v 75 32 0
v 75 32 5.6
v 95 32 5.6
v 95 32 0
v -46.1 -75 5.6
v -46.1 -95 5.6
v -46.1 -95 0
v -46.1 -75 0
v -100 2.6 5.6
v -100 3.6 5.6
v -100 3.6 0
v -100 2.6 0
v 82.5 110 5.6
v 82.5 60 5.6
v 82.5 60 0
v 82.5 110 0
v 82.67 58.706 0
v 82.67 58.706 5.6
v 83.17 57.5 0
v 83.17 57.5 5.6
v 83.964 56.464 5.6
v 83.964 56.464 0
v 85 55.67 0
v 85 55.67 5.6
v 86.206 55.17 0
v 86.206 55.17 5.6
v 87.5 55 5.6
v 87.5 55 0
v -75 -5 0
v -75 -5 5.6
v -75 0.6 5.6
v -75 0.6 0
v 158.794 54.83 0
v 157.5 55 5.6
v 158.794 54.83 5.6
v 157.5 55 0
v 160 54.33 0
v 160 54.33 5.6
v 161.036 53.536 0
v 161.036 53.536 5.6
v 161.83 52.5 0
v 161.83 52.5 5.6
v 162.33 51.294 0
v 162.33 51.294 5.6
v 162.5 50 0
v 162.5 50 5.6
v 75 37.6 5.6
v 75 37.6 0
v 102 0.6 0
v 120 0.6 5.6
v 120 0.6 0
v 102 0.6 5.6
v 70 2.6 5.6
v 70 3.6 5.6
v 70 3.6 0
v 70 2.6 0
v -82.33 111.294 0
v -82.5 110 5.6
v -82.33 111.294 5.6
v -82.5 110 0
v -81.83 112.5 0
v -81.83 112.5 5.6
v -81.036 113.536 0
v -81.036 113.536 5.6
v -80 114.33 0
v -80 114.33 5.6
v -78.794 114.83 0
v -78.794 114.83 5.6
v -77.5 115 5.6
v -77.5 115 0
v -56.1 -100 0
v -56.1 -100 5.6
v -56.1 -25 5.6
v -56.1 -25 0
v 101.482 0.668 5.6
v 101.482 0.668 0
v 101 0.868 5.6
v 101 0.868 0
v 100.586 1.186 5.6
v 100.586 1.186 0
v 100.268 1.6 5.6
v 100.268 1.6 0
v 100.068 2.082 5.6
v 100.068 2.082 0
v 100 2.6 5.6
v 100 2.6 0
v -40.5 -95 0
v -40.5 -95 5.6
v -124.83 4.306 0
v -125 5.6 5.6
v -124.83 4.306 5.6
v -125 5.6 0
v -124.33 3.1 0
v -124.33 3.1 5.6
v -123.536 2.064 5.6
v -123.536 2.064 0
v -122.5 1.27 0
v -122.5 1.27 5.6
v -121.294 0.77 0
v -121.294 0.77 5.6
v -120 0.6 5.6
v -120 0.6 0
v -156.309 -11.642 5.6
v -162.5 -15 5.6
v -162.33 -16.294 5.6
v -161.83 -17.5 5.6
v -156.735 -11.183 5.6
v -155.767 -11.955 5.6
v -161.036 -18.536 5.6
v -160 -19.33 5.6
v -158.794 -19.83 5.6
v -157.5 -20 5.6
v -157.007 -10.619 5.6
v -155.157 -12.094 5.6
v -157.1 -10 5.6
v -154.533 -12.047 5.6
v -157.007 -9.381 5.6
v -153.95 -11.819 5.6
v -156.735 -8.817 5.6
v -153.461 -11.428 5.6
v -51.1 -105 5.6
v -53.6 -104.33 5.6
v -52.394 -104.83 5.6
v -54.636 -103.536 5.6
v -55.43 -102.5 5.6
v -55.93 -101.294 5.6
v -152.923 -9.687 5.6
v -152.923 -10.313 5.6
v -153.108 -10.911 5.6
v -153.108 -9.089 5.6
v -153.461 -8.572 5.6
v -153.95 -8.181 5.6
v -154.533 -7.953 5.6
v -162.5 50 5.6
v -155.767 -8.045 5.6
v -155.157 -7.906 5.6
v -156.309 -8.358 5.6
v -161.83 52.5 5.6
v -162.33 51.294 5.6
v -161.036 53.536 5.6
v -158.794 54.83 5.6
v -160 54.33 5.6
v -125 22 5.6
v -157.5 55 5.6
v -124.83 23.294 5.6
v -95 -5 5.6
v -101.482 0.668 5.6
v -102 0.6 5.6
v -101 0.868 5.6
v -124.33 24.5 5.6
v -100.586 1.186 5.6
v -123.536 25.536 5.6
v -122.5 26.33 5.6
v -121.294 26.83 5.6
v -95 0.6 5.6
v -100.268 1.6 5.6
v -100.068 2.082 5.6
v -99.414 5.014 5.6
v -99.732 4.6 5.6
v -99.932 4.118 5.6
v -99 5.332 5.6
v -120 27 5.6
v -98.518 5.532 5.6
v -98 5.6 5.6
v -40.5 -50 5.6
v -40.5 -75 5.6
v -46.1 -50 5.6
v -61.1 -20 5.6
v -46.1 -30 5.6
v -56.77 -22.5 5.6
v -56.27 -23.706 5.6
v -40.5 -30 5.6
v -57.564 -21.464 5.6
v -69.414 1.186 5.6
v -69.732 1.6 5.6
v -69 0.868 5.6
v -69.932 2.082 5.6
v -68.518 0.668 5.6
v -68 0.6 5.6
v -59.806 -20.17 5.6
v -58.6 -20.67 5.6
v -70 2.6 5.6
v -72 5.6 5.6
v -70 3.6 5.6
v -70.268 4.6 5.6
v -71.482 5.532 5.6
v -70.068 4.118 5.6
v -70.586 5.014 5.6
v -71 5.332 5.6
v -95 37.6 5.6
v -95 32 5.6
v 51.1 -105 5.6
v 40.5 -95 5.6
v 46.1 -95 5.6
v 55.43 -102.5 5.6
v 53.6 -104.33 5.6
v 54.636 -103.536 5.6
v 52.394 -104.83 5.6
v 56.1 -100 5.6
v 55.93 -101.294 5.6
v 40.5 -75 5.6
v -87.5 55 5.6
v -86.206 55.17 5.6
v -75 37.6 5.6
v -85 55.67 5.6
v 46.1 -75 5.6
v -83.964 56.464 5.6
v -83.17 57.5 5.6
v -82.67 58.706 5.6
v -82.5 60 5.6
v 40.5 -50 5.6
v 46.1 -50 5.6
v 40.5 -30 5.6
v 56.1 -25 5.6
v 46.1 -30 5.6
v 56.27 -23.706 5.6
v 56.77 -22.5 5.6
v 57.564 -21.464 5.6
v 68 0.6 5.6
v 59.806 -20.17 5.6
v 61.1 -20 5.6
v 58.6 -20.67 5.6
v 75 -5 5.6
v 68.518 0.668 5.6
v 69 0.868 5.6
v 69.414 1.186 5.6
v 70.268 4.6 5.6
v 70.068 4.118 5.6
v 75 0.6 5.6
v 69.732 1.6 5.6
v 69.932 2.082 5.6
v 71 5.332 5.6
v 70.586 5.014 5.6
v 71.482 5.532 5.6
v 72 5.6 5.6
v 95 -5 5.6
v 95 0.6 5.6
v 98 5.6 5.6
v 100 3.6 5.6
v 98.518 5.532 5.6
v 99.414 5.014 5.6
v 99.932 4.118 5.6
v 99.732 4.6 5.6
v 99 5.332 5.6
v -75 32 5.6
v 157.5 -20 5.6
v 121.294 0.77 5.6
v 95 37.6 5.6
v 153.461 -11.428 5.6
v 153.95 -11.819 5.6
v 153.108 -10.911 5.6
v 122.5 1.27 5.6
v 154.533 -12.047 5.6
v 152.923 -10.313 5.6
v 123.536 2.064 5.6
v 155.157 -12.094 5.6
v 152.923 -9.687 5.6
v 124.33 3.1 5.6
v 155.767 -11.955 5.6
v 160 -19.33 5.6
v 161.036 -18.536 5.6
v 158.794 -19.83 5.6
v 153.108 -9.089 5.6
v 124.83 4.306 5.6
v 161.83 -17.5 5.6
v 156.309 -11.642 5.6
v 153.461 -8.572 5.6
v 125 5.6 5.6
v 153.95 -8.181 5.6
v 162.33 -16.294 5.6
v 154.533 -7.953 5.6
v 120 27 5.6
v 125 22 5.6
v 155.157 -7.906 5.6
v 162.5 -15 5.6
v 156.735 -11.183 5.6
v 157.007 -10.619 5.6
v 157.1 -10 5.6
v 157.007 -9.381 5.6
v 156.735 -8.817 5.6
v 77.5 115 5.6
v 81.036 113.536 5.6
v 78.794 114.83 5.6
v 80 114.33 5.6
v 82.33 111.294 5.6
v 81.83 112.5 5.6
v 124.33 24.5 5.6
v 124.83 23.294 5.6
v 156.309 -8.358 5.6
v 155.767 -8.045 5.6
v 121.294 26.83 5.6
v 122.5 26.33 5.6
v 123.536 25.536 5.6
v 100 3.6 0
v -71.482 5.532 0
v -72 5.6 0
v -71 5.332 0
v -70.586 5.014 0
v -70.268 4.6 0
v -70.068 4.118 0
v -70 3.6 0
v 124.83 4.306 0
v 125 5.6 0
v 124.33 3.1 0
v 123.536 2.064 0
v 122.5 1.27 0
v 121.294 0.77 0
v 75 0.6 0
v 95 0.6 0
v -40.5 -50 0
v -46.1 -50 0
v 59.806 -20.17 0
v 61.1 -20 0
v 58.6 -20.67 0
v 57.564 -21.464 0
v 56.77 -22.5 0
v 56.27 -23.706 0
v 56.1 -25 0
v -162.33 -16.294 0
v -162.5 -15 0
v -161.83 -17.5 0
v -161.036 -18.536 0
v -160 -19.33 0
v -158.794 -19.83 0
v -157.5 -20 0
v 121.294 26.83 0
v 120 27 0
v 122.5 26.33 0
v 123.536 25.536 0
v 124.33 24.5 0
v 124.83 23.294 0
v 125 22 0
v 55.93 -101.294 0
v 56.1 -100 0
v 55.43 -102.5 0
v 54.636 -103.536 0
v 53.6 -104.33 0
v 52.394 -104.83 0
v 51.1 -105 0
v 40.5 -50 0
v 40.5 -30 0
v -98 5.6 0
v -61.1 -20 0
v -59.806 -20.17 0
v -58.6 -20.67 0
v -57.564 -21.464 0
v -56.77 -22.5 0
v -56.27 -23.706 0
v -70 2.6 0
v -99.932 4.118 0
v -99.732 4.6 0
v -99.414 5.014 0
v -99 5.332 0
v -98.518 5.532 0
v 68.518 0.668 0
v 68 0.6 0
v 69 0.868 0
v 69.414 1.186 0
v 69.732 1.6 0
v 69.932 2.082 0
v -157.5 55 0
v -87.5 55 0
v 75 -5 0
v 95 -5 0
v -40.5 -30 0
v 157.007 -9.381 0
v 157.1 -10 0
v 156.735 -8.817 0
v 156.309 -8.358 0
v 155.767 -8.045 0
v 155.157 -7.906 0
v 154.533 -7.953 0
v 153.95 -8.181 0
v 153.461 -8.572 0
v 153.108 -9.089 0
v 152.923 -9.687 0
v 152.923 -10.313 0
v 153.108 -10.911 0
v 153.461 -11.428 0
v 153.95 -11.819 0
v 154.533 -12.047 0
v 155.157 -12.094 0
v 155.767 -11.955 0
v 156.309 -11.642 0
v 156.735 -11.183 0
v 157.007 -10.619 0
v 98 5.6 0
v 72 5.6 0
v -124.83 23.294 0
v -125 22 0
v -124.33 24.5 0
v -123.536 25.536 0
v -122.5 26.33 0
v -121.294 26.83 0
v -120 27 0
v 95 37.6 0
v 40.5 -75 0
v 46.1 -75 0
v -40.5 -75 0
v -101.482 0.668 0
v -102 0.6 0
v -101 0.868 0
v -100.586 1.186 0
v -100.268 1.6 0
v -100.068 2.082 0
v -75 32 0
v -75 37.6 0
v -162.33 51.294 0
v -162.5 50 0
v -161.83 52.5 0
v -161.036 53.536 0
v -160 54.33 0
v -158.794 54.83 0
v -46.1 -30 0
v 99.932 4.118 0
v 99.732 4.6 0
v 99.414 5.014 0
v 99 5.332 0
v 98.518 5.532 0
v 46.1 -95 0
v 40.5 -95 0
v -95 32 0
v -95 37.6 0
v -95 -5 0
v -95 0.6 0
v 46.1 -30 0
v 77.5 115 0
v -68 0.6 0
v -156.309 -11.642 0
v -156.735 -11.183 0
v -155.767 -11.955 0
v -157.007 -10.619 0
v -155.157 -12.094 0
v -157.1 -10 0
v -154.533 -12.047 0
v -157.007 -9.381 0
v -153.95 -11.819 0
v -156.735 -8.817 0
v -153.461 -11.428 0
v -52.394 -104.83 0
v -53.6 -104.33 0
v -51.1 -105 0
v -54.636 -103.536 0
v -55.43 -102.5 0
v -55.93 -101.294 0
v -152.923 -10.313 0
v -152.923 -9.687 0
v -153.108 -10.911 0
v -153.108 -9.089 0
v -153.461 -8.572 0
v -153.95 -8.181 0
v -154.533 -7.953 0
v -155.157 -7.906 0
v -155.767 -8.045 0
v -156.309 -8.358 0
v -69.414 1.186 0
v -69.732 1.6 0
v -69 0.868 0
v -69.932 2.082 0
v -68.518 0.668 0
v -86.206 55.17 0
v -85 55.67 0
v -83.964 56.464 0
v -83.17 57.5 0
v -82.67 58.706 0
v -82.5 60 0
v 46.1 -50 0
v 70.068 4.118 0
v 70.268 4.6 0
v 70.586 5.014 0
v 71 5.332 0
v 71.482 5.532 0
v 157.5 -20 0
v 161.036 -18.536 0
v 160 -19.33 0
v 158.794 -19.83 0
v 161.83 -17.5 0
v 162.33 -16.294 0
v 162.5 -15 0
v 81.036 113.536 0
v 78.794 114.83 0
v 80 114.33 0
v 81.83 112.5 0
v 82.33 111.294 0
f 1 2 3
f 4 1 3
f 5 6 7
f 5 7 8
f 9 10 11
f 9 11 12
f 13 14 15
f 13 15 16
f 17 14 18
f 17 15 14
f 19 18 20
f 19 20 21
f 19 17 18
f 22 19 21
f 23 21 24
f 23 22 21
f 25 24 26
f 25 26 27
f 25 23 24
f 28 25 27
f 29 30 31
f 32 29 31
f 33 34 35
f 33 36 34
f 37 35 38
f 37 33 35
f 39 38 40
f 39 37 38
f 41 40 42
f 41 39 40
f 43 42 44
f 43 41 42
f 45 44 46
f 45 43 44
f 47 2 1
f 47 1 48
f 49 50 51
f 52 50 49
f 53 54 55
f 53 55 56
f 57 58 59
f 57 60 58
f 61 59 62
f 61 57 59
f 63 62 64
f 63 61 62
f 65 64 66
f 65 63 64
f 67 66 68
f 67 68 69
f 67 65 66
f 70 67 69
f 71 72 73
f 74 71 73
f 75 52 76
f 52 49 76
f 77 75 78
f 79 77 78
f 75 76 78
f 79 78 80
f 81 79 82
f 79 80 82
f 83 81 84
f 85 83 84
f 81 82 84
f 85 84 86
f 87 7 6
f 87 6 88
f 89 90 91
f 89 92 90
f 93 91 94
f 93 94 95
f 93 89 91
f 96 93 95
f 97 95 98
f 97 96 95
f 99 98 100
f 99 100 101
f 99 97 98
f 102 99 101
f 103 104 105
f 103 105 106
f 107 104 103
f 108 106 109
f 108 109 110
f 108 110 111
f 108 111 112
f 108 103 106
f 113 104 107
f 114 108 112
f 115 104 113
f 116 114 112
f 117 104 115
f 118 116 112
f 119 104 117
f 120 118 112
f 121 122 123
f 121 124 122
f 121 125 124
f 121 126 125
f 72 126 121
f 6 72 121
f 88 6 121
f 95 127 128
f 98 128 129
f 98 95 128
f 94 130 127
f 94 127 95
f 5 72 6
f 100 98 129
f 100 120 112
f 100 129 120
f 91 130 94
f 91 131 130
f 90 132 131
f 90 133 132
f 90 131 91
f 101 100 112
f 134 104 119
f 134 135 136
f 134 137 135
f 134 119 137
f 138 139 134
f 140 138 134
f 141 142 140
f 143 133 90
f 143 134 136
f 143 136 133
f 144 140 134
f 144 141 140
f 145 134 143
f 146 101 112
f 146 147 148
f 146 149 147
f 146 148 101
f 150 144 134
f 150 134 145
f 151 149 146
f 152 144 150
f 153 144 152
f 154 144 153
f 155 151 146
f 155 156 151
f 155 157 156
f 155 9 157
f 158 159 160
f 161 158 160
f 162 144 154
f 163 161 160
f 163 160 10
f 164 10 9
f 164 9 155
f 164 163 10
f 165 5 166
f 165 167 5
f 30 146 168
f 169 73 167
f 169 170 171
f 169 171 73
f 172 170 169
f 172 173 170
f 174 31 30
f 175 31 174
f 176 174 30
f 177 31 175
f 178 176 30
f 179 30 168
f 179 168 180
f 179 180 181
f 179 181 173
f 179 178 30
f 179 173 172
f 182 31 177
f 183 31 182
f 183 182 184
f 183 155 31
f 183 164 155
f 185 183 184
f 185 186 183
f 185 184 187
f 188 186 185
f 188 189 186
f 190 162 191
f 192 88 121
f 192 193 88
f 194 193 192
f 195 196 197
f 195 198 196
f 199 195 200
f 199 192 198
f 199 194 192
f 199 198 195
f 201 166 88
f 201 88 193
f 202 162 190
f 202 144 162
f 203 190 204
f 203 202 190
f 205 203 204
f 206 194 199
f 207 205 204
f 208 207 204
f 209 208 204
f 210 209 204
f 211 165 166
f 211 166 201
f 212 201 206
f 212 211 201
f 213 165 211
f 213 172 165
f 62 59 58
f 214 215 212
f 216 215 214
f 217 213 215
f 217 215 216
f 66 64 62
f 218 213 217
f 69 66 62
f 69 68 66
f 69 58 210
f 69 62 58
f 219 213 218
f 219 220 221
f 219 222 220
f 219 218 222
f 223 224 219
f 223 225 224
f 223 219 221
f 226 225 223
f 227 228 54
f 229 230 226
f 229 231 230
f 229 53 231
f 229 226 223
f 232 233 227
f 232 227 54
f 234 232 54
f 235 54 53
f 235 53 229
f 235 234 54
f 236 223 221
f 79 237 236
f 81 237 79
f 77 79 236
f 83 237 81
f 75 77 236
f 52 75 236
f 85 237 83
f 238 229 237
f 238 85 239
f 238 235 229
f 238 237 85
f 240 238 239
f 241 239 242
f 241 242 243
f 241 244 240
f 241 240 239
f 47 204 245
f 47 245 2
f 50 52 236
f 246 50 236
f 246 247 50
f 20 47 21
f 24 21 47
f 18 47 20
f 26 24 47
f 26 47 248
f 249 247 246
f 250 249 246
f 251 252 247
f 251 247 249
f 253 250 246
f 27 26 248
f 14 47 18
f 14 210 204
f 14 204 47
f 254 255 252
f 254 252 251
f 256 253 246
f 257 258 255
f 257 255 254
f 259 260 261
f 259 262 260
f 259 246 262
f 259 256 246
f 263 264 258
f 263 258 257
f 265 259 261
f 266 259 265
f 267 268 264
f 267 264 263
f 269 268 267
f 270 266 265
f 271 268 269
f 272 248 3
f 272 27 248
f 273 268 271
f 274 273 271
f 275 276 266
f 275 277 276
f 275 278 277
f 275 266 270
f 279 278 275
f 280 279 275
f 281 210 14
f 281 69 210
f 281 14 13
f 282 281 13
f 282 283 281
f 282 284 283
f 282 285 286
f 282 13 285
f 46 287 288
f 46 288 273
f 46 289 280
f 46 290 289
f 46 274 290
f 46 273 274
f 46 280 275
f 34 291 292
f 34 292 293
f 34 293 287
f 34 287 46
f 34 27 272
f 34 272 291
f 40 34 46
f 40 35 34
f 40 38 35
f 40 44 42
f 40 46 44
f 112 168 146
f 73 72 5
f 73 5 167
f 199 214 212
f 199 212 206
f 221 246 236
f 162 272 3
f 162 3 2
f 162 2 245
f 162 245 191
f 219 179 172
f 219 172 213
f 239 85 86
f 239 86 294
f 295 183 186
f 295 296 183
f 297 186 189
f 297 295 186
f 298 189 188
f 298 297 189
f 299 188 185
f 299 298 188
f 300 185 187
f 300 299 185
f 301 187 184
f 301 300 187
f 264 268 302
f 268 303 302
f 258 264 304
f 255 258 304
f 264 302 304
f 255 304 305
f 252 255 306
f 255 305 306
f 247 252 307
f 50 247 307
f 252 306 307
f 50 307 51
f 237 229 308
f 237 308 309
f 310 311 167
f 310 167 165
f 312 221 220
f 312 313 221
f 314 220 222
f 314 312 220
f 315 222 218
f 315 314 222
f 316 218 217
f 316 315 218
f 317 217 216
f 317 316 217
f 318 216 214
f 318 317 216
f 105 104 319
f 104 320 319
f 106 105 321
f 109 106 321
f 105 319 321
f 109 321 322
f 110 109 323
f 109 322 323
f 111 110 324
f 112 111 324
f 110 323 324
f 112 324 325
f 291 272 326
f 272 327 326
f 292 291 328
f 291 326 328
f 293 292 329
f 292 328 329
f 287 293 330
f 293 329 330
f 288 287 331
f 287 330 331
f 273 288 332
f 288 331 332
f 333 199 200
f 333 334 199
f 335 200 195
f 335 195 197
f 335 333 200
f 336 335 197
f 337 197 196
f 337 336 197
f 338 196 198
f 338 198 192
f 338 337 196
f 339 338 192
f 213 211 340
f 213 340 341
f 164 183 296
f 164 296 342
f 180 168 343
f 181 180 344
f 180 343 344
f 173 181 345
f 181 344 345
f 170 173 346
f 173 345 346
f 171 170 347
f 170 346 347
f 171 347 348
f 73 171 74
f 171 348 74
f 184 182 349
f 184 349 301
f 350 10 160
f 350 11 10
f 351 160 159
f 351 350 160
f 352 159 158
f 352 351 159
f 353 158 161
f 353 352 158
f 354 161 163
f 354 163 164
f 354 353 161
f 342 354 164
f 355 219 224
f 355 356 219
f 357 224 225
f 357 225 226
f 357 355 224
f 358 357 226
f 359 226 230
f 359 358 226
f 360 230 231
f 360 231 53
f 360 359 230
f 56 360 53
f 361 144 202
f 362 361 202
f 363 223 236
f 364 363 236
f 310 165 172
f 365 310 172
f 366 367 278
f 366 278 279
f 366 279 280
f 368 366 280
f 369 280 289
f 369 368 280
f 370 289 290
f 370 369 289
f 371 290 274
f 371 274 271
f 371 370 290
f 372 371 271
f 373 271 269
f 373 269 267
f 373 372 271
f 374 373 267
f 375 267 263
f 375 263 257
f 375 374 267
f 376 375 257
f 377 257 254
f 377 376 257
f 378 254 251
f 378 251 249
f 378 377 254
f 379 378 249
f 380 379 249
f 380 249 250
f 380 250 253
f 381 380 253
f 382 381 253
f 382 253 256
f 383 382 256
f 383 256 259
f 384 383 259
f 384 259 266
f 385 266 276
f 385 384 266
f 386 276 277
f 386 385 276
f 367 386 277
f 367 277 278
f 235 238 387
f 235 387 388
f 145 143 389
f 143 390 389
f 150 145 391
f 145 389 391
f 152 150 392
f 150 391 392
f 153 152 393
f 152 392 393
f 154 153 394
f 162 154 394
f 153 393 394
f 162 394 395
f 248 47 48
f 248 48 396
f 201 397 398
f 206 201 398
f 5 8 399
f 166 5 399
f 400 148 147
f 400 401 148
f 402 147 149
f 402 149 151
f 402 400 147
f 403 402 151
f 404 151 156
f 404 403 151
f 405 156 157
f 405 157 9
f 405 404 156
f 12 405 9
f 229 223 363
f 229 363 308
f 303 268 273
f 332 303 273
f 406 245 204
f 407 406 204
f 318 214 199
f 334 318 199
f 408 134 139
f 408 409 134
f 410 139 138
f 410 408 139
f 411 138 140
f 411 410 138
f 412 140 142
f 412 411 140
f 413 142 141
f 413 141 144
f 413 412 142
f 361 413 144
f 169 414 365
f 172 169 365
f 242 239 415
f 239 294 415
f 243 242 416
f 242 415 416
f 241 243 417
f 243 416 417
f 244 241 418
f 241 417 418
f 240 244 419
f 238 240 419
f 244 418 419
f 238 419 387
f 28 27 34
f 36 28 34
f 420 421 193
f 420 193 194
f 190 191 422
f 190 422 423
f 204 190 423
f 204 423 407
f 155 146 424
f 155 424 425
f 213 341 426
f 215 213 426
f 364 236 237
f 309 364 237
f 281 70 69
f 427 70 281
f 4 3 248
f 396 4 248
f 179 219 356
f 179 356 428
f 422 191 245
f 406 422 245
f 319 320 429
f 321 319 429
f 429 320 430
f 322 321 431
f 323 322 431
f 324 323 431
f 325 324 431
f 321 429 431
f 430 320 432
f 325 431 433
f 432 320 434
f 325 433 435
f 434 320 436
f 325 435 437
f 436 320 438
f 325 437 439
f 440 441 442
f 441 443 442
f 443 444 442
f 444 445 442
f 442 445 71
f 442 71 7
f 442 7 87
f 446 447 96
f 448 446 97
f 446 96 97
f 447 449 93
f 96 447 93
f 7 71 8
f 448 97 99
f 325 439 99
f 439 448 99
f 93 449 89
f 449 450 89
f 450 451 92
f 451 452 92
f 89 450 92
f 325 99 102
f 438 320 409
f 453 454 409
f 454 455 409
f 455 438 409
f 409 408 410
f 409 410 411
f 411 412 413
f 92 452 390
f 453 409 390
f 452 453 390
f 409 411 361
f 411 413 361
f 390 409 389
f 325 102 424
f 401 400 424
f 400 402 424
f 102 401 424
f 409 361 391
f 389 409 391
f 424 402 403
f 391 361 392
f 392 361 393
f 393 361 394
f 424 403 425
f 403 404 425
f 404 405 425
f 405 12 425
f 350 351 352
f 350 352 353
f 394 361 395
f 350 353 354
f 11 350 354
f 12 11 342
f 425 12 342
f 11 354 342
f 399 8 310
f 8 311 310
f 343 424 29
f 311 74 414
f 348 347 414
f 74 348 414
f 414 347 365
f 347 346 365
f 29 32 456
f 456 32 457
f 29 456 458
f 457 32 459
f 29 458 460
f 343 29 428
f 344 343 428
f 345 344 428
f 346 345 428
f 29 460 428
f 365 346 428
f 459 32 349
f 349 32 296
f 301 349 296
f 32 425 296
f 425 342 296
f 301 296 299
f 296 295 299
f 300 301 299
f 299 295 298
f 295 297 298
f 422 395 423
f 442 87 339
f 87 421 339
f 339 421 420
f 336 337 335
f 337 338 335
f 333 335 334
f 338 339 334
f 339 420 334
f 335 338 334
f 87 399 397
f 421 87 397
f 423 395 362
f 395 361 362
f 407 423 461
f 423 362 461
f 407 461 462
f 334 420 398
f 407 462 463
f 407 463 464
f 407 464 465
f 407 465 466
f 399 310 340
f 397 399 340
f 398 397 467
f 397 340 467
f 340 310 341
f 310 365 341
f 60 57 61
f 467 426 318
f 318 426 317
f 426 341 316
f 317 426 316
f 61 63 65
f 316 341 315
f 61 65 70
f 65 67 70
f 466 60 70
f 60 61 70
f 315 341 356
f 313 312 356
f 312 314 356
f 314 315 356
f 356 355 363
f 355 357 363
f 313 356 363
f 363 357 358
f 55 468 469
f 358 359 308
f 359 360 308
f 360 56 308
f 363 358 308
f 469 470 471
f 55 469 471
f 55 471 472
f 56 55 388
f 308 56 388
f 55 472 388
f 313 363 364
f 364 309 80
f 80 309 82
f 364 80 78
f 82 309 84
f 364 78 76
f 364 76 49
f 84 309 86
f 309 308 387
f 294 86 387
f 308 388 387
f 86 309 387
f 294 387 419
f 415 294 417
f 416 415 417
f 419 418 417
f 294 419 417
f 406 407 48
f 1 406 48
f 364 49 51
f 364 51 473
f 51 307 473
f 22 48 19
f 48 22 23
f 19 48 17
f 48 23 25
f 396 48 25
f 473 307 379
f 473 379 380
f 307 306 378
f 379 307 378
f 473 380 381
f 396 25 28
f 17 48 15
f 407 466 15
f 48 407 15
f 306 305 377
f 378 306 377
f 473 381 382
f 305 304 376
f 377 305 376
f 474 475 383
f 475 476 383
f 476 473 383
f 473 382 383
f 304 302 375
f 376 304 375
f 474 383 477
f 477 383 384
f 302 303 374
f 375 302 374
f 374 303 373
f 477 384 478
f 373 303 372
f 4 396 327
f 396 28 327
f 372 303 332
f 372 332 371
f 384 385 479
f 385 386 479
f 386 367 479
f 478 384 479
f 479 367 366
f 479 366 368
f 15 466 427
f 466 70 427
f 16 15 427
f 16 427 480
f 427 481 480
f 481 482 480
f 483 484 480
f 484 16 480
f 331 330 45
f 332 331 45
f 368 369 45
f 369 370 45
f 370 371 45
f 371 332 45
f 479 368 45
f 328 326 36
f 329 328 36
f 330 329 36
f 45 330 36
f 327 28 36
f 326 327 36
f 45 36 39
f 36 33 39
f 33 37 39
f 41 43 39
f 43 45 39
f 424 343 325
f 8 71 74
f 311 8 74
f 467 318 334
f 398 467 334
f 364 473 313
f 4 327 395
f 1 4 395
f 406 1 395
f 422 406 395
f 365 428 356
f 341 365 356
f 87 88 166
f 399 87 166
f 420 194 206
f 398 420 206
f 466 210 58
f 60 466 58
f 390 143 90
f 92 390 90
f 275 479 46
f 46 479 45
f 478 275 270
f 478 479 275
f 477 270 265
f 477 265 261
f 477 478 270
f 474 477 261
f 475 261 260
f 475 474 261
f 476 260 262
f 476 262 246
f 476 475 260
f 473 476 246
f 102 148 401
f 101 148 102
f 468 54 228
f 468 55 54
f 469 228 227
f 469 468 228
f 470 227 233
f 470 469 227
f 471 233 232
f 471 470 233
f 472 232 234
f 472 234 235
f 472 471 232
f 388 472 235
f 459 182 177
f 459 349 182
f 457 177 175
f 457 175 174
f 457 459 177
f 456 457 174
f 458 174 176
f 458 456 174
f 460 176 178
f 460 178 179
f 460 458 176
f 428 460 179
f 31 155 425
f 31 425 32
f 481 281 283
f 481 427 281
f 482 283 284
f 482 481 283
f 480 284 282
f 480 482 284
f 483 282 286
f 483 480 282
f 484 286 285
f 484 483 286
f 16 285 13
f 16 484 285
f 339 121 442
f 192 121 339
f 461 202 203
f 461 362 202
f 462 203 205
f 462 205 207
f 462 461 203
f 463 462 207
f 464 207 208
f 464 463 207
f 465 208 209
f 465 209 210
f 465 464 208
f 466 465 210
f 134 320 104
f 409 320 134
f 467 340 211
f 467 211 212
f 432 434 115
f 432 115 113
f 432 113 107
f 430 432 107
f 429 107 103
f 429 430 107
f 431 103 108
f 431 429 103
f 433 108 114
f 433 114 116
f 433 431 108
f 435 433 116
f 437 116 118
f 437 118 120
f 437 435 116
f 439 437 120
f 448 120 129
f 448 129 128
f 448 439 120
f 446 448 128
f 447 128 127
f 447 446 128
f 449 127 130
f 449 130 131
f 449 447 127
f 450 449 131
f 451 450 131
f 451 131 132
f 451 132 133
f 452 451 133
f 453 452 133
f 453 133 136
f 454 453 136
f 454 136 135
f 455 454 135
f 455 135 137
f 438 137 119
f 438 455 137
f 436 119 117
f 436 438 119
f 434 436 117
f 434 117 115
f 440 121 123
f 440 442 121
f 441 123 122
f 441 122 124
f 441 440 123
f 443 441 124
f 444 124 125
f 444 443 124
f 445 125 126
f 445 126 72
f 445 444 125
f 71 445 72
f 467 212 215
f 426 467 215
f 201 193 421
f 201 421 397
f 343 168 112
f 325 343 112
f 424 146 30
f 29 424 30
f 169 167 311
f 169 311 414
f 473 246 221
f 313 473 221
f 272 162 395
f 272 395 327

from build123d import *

# Parameters (mm, degrees)
SKETCH_1_W          = 325
SKETCH_1_H          = 230
SKETCH_1_R          = 2.1
EXTRUDE_1_DEPTH     = 5.6
SKETCH_2_W          = 5.6
SKETCH_2_H          = 20
SKETCH_2_W_2        = 20
SKETCH_2_H_2        = 5.6
CUT_EXTRUDE_1_DEPTH = 200.154738834
SKETCH_3_R          = 2.1
SKETCH_3_W          = 56.1
SKETCH_3_H          = 10
CUT_EXTRUDE_2_DEPTH = 200.154738834
CUT_EXTRUDE_3_DEPTH = 200.154738834
SKETCH_5_W          = 80
SKETCH_5_H          = 60
CUT_EXTRUDE_4_DEPTH = 200.154738834
FILLET_1_R          = 5
FILLET_2_R          = 2


with BuildPart() as part:
    # ｽｹｯﾁ1 → ﾎﾞｽ - 押し出し1 (new body)
    with BuildSketch(Plane.XY):
        Rectangle(SKETCH_1_W, SKETCH_1_H)
        with Locations((155, 110)):
            Circle(SKETCH_1_R, mode=Mode.SUBTRACT)
        with Locations(Location((155, -110, 0), (0, 0, 180))):
            Circle(SKETCH_1_R, mode=Mode.SUBTRACT)
        with Locations(Location((-155, 110, 0), (0, 0, 180))):
            Circle(SKETCH_1_R, mode=Mode.SUBTRACT)
        with Locations((-155, -110)):
            Circle(SKETCH_1_R, mode=Mode.SUBTRACT)
        with Locations((155, -10)):
            Circle(SKETCH_1_R, mode=Mode.SUBTRACT)
        with Locations(Location((-155, -10, 0), (0, 0, 180))):
            Circle(SKETCH_1_R, mode=Mode.SUBTRACT)
    extrude(amount=EXTRUDE_1_DEPTH)

    # ｽｹｯﾁ2 → ｶｯﾄ - 押し出し1 (cut, through all)
    with BuildSketch(Plane.XY.offset(5.6)):
        with Locations((43.3, -40)):
            Rectangle(SKETCH_2_W, SKETCH_2_H)
        with Locations((-43.3, -40)):
            Rectangle(SKETCH_2_W, SKETCH_2_H)
        with Locations((43.3, -85)):
            Rectangle(SKETCH_2_W, SKETCH_2_H)
        with Locations((-43.3, -85)):
            Rectangle(SKETCH_2_W, SKETCH_2_H)
        with Locations((85, -2.2)):
            Rectangle(SKETCH_2_W_2, SKETCH_2_H_2)
        with Locations((-85, -2.2)):
            Rectangle(SKETCH_2_W_2, SKETCH_2_H_2)
        with Locations((85, 34.8)):
            Rectangle(SKETCH_2_W_2, SKETCH_2_H_2)
        with Locations((-85, 34.8)):
            Rectangle(SKETCH_2_W_2, SKETCH_2_H_2)
    extrude(amount=-CUT_EXTRUDE_1_DEPTH, mode=Mode.SUBTRACT)

    # ｽｹｯﾁ3 → ｶｯﾄ - 押し出し2 (cut, through all)
    # profile 1 of 4: a face of its own
    with BuildSketch(Plane.XY.offset(5.6)):
        Polygon((-56.1, -115), (-56.1, -105), (-56.1, -20), (-162.5, -20), (-162.5, -115), align=None)
        with Locations((-155, -110)):
            Circle(SKETCH_3_R, mode=Mode.SUBTRACT)
    # profile 2 of 4: a face of its own
    with BuildSketch(Plane.XY.offset(5.6)):
        with Locations((-28.05, -110)):
            Rectangle(SKETCH_3_W, SKETCH_3_H)
    # profile 3 of 4: a face of its own
    with BuildSketch(Plane.XY.offset(5.6)):
        with Locations((28.05, -110)):
            Rectangle(SKETCH_3_W, SKETCH_3_H)
    # profile 4 of 4: a face of its own
    with BuildSketch(Plane.XY.offset(5.6)):
        Polygon((56.1, -20), (56.1, -105), (56.1, -115), (162.5, -115), (162.5, -20), align=None)
        with Locations((155, -110)):
            Circle(SKETCH_3_R, mode=Mode.SUBTRACT)
    extrude(amount=-CUT_EXTRUDE_2_DEPTH, mode=Mode.SUBTRACT)

    # ｽｹｯﾁ4 → ｶｯﾄ - 押し出し3 (cut, through all)
    with BuildSketch(Plane.XY.offset(5.6)):
        Polygon((-125, 27), (125, 27), (125, 5.6), (125, 0.6), (100, 0.6), (100, 5.6), (70, 5.6), (70, 0.6), (-70, 0.6), (-70, 5.6), (-100, 5.6), (-100, 0.6), (-125, 0.6), (-125, 5.6), align=None)
    extrude(amount=-CUT_EXTRUDE_3_DEPTH, mode=Mode.SUBTRACT)

    # ｽｹｯﾁ5 → ｶｯﾄ - 押し出し4 (cut, through all)
    with BuildSketch(Plane.XY.offset(5.6)):
        with Locations((-122.5, 85)):
            Rectangle(SKETCH_5_W, SKETCH_5_H)
        with Locations((122.5, 85)):
            Rectangle(SKETCH_5_W, SKETCH_5_H)
    extrude(amount=-CUT_EXTRUDE_4_DEPTH, mode=Mode.SUBTRACT)

    # ﾌｨﾚｯﾄ1
    fillet_1_edges = [part.edges().sort_by_distance(p)[0] for p in [
        (-162.5, -20, 2.8),
        (-56.1, -20, 2.8),
        (-56.1, -105, 2.8),
        (56.1, -105, 2.8),
        (56.1, -20, 2.8),
        (162.5, -20, 2.8),
        (125, 0.6, 2.8),
        (-125, 0.6, 2.8),
        (-125, 27, 2.8),
        (125, 27, 2.8),
        (-162.5, 55, 2.8),
        (-82.5, 115, 2.8),
        (-82.5, 55, 2.8),
        (82.5, 115, 2.8),
        (162.5, 55, 2.8),
        (82.5, 55, 2.8),
    ]]
    fillet(fillet_1_edges, radius=FILLET_1_R)

    # ﾌｨﾚｯﾄ2
    fillet_2_edges = [part.edges().sort_by_distance(p)[0] for p in [
        (100, 0.6, 2.8),
        (100, 5.6, 2.8),
        (70, 5.6, 2.8),
        (70, 0.6, 2.8),
        (-70, 0.6, 2.8),
        (-70, 5.6, 2.8),
        (-100, 5.6, 2.8),
        (-100, 0.6, 2.8),
    ]]
    fillet(fillet_2_edges, radius=FILLET_2_R)


solid = part.part
